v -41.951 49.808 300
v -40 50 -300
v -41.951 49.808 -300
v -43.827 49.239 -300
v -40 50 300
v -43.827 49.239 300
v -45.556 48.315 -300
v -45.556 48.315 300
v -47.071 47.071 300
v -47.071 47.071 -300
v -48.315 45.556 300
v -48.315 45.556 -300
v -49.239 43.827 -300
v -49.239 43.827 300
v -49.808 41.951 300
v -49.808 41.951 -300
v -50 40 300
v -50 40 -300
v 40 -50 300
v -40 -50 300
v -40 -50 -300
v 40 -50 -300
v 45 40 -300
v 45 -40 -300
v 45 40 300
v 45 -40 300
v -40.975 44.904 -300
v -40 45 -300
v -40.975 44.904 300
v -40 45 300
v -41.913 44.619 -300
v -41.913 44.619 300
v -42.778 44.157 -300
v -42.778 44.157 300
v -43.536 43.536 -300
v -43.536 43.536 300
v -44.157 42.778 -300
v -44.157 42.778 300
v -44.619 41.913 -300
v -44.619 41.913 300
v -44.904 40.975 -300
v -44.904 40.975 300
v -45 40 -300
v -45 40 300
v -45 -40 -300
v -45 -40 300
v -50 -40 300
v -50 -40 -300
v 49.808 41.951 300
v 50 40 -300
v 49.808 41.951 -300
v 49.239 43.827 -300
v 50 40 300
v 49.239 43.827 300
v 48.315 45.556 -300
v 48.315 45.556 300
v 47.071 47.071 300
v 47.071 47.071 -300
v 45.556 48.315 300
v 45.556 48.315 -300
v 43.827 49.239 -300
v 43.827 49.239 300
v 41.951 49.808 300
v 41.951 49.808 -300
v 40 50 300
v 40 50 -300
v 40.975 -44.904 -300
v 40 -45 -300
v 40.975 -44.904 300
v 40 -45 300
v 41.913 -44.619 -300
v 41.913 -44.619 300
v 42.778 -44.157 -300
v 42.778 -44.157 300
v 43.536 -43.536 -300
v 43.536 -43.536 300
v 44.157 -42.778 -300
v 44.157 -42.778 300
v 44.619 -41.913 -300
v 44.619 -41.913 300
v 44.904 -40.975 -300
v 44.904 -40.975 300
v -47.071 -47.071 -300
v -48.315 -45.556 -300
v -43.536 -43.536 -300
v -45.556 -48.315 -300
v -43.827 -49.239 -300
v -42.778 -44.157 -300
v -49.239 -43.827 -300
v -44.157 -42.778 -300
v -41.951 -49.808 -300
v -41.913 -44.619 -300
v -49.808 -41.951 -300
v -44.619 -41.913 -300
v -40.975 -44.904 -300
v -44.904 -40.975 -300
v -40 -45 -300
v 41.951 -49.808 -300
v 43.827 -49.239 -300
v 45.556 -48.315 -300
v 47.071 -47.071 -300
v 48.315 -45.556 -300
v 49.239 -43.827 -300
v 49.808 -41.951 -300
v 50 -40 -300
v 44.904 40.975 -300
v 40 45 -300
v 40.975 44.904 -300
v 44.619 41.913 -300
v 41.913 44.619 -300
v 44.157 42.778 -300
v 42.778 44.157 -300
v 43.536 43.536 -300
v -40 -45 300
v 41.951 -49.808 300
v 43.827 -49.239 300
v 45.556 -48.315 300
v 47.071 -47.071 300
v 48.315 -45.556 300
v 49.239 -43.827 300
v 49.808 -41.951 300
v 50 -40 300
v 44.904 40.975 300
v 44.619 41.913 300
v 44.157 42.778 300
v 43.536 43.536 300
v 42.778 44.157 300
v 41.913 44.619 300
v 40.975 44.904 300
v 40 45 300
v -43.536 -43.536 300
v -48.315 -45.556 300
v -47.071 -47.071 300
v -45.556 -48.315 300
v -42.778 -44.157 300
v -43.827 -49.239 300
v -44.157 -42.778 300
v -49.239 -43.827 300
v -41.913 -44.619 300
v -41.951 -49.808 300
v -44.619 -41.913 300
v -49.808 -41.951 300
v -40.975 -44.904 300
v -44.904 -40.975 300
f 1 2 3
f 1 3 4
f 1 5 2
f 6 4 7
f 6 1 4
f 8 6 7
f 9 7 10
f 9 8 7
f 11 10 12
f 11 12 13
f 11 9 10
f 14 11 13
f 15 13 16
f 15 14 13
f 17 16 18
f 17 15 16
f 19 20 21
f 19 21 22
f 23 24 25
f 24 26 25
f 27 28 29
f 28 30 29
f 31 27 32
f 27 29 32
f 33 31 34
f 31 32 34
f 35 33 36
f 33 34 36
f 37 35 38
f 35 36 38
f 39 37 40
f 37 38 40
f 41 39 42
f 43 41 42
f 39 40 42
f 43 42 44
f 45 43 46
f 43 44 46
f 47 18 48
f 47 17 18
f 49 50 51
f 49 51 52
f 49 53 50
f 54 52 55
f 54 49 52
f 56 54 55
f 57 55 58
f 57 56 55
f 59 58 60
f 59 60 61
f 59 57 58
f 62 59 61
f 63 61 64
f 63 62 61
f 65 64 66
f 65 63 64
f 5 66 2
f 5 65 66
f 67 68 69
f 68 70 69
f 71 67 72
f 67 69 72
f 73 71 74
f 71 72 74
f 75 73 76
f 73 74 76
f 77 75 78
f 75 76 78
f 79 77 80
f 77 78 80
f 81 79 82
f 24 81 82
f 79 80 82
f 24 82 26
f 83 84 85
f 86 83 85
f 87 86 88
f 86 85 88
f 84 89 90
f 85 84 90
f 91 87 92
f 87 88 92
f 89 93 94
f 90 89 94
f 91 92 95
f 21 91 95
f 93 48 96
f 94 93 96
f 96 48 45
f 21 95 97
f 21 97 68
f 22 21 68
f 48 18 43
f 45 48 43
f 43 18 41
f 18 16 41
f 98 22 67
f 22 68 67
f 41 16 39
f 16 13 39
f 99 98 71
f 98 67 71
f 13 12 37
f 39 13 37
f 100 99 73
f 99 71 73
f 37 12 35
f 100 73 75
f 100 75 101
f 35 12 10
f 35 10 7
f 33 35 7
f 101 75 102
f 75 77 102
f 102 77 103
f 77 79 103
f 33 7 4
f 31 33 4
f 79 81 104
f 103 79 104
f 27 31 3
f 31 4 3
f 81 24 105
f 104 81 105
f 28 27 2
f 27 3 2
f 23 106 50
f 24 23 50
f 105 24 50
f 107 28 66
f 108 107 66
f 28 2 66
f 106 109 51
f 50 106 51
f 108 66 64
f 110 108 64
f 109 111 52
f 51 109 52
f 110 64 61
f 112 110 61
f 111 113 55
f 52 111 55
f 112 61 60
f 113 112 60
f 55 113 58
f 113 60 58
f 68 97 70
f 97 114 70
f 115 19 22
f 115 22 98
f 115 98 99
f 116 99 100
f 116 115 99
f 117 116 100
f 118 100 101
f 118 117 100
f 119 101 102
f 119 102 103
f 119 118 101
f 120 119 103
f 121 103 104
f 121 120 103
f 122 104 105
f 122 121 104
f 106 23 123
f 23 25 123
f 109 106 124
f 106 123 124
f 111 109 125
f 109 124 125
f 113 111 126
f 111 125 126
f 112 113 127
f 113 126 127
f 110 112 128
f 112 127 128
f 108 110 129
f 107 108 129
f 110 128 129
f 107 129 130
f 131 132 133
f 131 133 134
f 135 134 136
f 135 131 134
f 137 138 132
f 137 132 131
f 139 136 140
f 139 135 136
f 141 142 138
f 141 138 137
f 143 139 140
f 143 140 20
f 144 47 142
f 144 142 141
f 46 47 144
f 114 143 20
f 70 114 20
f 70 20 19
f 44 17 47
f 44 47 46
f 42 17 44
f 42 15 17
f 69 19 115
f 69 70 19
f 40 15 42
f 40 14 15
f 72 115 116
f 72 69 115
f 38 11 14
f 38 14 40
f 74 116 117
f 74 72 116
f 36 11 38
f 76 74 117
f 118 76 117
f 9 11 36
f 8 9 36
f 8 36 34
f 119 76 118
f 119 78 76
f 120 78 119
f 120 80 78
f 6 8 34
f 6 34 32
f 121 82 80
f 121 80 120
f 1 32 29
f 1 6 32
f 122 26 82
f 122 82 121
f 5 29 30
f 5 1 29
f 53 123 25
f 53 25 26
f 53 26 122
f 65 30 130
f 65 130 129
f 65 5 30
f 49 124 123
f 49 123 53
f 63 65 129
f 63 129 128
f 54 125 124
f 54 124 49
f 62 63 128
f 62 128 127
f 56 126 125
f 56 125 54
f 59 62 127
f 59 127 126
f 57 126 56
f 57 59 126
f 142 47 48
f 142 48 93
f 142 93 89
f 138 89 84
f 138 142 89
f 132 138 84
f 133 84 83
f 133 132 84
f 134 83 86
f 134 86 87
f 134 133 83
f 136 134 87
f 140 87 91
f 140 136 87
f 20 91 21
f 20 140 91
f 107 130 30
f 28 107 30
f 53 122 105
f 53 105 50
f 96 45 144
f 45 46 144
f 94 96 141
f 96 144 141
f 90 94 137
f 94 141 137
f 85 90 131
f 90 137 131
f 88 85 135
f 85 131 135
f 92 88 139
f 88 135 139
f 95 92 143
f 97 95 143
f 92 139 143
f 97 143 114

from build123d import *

# Parameters (mm, degrees)
BOSS_EXTRUDE1_DEPTH = 300


with BuildPart() as part:
    # Sketch2 → Boss-Extrude1 (new body, symmetric)
    with BuildSketch(Plane.XY):
        with BuildLine():
            Line((-50, 40), (-50, -40))
            ThreePointArc((-50, -40), (-47.071067812, -47.071067812), (-40, -50))
            Line((-40, -50), (40, -50))
            ThreePointArc((40, -50), (47.071067812, -47.071067812), (50, -40))
            Line((50, -40), (50, 40))
            ThreePointArc((50, 40), (47.071067812, 47.071067812), (40, 50))
            Line((40, 50), (-40, 50))
            ThreePointArc((-40, 50), (-47.071067812, 47.071067812), (-50, 40))
        make_face()
        with BuildLine():
            Line((40, 45), (-40, 45))
            ThreePointArc((-40, 45), (-43.535533906, 43.535533906), (-45, 40))
            Line((-45, 40), (-45, -40))
            ThreePointArc((-45, -40), (-43.535533906, -43.535533906), (-40, -45))
            Line((-40, -45), (40, -45))
            ThreePointArc((40, -45), (43.535533906, -43.535533906), (45, -40))
            Line((45, -40), (45, 40))
            ThreePointArc((45, 40), (43.535533906, 43.535533906), (40, 45))
        make_face(mode=Mode.SUBTRACT)
    extrude(amount=BOSS_EXTRUDE1_DEPTH, both=True)


solid = part.part
